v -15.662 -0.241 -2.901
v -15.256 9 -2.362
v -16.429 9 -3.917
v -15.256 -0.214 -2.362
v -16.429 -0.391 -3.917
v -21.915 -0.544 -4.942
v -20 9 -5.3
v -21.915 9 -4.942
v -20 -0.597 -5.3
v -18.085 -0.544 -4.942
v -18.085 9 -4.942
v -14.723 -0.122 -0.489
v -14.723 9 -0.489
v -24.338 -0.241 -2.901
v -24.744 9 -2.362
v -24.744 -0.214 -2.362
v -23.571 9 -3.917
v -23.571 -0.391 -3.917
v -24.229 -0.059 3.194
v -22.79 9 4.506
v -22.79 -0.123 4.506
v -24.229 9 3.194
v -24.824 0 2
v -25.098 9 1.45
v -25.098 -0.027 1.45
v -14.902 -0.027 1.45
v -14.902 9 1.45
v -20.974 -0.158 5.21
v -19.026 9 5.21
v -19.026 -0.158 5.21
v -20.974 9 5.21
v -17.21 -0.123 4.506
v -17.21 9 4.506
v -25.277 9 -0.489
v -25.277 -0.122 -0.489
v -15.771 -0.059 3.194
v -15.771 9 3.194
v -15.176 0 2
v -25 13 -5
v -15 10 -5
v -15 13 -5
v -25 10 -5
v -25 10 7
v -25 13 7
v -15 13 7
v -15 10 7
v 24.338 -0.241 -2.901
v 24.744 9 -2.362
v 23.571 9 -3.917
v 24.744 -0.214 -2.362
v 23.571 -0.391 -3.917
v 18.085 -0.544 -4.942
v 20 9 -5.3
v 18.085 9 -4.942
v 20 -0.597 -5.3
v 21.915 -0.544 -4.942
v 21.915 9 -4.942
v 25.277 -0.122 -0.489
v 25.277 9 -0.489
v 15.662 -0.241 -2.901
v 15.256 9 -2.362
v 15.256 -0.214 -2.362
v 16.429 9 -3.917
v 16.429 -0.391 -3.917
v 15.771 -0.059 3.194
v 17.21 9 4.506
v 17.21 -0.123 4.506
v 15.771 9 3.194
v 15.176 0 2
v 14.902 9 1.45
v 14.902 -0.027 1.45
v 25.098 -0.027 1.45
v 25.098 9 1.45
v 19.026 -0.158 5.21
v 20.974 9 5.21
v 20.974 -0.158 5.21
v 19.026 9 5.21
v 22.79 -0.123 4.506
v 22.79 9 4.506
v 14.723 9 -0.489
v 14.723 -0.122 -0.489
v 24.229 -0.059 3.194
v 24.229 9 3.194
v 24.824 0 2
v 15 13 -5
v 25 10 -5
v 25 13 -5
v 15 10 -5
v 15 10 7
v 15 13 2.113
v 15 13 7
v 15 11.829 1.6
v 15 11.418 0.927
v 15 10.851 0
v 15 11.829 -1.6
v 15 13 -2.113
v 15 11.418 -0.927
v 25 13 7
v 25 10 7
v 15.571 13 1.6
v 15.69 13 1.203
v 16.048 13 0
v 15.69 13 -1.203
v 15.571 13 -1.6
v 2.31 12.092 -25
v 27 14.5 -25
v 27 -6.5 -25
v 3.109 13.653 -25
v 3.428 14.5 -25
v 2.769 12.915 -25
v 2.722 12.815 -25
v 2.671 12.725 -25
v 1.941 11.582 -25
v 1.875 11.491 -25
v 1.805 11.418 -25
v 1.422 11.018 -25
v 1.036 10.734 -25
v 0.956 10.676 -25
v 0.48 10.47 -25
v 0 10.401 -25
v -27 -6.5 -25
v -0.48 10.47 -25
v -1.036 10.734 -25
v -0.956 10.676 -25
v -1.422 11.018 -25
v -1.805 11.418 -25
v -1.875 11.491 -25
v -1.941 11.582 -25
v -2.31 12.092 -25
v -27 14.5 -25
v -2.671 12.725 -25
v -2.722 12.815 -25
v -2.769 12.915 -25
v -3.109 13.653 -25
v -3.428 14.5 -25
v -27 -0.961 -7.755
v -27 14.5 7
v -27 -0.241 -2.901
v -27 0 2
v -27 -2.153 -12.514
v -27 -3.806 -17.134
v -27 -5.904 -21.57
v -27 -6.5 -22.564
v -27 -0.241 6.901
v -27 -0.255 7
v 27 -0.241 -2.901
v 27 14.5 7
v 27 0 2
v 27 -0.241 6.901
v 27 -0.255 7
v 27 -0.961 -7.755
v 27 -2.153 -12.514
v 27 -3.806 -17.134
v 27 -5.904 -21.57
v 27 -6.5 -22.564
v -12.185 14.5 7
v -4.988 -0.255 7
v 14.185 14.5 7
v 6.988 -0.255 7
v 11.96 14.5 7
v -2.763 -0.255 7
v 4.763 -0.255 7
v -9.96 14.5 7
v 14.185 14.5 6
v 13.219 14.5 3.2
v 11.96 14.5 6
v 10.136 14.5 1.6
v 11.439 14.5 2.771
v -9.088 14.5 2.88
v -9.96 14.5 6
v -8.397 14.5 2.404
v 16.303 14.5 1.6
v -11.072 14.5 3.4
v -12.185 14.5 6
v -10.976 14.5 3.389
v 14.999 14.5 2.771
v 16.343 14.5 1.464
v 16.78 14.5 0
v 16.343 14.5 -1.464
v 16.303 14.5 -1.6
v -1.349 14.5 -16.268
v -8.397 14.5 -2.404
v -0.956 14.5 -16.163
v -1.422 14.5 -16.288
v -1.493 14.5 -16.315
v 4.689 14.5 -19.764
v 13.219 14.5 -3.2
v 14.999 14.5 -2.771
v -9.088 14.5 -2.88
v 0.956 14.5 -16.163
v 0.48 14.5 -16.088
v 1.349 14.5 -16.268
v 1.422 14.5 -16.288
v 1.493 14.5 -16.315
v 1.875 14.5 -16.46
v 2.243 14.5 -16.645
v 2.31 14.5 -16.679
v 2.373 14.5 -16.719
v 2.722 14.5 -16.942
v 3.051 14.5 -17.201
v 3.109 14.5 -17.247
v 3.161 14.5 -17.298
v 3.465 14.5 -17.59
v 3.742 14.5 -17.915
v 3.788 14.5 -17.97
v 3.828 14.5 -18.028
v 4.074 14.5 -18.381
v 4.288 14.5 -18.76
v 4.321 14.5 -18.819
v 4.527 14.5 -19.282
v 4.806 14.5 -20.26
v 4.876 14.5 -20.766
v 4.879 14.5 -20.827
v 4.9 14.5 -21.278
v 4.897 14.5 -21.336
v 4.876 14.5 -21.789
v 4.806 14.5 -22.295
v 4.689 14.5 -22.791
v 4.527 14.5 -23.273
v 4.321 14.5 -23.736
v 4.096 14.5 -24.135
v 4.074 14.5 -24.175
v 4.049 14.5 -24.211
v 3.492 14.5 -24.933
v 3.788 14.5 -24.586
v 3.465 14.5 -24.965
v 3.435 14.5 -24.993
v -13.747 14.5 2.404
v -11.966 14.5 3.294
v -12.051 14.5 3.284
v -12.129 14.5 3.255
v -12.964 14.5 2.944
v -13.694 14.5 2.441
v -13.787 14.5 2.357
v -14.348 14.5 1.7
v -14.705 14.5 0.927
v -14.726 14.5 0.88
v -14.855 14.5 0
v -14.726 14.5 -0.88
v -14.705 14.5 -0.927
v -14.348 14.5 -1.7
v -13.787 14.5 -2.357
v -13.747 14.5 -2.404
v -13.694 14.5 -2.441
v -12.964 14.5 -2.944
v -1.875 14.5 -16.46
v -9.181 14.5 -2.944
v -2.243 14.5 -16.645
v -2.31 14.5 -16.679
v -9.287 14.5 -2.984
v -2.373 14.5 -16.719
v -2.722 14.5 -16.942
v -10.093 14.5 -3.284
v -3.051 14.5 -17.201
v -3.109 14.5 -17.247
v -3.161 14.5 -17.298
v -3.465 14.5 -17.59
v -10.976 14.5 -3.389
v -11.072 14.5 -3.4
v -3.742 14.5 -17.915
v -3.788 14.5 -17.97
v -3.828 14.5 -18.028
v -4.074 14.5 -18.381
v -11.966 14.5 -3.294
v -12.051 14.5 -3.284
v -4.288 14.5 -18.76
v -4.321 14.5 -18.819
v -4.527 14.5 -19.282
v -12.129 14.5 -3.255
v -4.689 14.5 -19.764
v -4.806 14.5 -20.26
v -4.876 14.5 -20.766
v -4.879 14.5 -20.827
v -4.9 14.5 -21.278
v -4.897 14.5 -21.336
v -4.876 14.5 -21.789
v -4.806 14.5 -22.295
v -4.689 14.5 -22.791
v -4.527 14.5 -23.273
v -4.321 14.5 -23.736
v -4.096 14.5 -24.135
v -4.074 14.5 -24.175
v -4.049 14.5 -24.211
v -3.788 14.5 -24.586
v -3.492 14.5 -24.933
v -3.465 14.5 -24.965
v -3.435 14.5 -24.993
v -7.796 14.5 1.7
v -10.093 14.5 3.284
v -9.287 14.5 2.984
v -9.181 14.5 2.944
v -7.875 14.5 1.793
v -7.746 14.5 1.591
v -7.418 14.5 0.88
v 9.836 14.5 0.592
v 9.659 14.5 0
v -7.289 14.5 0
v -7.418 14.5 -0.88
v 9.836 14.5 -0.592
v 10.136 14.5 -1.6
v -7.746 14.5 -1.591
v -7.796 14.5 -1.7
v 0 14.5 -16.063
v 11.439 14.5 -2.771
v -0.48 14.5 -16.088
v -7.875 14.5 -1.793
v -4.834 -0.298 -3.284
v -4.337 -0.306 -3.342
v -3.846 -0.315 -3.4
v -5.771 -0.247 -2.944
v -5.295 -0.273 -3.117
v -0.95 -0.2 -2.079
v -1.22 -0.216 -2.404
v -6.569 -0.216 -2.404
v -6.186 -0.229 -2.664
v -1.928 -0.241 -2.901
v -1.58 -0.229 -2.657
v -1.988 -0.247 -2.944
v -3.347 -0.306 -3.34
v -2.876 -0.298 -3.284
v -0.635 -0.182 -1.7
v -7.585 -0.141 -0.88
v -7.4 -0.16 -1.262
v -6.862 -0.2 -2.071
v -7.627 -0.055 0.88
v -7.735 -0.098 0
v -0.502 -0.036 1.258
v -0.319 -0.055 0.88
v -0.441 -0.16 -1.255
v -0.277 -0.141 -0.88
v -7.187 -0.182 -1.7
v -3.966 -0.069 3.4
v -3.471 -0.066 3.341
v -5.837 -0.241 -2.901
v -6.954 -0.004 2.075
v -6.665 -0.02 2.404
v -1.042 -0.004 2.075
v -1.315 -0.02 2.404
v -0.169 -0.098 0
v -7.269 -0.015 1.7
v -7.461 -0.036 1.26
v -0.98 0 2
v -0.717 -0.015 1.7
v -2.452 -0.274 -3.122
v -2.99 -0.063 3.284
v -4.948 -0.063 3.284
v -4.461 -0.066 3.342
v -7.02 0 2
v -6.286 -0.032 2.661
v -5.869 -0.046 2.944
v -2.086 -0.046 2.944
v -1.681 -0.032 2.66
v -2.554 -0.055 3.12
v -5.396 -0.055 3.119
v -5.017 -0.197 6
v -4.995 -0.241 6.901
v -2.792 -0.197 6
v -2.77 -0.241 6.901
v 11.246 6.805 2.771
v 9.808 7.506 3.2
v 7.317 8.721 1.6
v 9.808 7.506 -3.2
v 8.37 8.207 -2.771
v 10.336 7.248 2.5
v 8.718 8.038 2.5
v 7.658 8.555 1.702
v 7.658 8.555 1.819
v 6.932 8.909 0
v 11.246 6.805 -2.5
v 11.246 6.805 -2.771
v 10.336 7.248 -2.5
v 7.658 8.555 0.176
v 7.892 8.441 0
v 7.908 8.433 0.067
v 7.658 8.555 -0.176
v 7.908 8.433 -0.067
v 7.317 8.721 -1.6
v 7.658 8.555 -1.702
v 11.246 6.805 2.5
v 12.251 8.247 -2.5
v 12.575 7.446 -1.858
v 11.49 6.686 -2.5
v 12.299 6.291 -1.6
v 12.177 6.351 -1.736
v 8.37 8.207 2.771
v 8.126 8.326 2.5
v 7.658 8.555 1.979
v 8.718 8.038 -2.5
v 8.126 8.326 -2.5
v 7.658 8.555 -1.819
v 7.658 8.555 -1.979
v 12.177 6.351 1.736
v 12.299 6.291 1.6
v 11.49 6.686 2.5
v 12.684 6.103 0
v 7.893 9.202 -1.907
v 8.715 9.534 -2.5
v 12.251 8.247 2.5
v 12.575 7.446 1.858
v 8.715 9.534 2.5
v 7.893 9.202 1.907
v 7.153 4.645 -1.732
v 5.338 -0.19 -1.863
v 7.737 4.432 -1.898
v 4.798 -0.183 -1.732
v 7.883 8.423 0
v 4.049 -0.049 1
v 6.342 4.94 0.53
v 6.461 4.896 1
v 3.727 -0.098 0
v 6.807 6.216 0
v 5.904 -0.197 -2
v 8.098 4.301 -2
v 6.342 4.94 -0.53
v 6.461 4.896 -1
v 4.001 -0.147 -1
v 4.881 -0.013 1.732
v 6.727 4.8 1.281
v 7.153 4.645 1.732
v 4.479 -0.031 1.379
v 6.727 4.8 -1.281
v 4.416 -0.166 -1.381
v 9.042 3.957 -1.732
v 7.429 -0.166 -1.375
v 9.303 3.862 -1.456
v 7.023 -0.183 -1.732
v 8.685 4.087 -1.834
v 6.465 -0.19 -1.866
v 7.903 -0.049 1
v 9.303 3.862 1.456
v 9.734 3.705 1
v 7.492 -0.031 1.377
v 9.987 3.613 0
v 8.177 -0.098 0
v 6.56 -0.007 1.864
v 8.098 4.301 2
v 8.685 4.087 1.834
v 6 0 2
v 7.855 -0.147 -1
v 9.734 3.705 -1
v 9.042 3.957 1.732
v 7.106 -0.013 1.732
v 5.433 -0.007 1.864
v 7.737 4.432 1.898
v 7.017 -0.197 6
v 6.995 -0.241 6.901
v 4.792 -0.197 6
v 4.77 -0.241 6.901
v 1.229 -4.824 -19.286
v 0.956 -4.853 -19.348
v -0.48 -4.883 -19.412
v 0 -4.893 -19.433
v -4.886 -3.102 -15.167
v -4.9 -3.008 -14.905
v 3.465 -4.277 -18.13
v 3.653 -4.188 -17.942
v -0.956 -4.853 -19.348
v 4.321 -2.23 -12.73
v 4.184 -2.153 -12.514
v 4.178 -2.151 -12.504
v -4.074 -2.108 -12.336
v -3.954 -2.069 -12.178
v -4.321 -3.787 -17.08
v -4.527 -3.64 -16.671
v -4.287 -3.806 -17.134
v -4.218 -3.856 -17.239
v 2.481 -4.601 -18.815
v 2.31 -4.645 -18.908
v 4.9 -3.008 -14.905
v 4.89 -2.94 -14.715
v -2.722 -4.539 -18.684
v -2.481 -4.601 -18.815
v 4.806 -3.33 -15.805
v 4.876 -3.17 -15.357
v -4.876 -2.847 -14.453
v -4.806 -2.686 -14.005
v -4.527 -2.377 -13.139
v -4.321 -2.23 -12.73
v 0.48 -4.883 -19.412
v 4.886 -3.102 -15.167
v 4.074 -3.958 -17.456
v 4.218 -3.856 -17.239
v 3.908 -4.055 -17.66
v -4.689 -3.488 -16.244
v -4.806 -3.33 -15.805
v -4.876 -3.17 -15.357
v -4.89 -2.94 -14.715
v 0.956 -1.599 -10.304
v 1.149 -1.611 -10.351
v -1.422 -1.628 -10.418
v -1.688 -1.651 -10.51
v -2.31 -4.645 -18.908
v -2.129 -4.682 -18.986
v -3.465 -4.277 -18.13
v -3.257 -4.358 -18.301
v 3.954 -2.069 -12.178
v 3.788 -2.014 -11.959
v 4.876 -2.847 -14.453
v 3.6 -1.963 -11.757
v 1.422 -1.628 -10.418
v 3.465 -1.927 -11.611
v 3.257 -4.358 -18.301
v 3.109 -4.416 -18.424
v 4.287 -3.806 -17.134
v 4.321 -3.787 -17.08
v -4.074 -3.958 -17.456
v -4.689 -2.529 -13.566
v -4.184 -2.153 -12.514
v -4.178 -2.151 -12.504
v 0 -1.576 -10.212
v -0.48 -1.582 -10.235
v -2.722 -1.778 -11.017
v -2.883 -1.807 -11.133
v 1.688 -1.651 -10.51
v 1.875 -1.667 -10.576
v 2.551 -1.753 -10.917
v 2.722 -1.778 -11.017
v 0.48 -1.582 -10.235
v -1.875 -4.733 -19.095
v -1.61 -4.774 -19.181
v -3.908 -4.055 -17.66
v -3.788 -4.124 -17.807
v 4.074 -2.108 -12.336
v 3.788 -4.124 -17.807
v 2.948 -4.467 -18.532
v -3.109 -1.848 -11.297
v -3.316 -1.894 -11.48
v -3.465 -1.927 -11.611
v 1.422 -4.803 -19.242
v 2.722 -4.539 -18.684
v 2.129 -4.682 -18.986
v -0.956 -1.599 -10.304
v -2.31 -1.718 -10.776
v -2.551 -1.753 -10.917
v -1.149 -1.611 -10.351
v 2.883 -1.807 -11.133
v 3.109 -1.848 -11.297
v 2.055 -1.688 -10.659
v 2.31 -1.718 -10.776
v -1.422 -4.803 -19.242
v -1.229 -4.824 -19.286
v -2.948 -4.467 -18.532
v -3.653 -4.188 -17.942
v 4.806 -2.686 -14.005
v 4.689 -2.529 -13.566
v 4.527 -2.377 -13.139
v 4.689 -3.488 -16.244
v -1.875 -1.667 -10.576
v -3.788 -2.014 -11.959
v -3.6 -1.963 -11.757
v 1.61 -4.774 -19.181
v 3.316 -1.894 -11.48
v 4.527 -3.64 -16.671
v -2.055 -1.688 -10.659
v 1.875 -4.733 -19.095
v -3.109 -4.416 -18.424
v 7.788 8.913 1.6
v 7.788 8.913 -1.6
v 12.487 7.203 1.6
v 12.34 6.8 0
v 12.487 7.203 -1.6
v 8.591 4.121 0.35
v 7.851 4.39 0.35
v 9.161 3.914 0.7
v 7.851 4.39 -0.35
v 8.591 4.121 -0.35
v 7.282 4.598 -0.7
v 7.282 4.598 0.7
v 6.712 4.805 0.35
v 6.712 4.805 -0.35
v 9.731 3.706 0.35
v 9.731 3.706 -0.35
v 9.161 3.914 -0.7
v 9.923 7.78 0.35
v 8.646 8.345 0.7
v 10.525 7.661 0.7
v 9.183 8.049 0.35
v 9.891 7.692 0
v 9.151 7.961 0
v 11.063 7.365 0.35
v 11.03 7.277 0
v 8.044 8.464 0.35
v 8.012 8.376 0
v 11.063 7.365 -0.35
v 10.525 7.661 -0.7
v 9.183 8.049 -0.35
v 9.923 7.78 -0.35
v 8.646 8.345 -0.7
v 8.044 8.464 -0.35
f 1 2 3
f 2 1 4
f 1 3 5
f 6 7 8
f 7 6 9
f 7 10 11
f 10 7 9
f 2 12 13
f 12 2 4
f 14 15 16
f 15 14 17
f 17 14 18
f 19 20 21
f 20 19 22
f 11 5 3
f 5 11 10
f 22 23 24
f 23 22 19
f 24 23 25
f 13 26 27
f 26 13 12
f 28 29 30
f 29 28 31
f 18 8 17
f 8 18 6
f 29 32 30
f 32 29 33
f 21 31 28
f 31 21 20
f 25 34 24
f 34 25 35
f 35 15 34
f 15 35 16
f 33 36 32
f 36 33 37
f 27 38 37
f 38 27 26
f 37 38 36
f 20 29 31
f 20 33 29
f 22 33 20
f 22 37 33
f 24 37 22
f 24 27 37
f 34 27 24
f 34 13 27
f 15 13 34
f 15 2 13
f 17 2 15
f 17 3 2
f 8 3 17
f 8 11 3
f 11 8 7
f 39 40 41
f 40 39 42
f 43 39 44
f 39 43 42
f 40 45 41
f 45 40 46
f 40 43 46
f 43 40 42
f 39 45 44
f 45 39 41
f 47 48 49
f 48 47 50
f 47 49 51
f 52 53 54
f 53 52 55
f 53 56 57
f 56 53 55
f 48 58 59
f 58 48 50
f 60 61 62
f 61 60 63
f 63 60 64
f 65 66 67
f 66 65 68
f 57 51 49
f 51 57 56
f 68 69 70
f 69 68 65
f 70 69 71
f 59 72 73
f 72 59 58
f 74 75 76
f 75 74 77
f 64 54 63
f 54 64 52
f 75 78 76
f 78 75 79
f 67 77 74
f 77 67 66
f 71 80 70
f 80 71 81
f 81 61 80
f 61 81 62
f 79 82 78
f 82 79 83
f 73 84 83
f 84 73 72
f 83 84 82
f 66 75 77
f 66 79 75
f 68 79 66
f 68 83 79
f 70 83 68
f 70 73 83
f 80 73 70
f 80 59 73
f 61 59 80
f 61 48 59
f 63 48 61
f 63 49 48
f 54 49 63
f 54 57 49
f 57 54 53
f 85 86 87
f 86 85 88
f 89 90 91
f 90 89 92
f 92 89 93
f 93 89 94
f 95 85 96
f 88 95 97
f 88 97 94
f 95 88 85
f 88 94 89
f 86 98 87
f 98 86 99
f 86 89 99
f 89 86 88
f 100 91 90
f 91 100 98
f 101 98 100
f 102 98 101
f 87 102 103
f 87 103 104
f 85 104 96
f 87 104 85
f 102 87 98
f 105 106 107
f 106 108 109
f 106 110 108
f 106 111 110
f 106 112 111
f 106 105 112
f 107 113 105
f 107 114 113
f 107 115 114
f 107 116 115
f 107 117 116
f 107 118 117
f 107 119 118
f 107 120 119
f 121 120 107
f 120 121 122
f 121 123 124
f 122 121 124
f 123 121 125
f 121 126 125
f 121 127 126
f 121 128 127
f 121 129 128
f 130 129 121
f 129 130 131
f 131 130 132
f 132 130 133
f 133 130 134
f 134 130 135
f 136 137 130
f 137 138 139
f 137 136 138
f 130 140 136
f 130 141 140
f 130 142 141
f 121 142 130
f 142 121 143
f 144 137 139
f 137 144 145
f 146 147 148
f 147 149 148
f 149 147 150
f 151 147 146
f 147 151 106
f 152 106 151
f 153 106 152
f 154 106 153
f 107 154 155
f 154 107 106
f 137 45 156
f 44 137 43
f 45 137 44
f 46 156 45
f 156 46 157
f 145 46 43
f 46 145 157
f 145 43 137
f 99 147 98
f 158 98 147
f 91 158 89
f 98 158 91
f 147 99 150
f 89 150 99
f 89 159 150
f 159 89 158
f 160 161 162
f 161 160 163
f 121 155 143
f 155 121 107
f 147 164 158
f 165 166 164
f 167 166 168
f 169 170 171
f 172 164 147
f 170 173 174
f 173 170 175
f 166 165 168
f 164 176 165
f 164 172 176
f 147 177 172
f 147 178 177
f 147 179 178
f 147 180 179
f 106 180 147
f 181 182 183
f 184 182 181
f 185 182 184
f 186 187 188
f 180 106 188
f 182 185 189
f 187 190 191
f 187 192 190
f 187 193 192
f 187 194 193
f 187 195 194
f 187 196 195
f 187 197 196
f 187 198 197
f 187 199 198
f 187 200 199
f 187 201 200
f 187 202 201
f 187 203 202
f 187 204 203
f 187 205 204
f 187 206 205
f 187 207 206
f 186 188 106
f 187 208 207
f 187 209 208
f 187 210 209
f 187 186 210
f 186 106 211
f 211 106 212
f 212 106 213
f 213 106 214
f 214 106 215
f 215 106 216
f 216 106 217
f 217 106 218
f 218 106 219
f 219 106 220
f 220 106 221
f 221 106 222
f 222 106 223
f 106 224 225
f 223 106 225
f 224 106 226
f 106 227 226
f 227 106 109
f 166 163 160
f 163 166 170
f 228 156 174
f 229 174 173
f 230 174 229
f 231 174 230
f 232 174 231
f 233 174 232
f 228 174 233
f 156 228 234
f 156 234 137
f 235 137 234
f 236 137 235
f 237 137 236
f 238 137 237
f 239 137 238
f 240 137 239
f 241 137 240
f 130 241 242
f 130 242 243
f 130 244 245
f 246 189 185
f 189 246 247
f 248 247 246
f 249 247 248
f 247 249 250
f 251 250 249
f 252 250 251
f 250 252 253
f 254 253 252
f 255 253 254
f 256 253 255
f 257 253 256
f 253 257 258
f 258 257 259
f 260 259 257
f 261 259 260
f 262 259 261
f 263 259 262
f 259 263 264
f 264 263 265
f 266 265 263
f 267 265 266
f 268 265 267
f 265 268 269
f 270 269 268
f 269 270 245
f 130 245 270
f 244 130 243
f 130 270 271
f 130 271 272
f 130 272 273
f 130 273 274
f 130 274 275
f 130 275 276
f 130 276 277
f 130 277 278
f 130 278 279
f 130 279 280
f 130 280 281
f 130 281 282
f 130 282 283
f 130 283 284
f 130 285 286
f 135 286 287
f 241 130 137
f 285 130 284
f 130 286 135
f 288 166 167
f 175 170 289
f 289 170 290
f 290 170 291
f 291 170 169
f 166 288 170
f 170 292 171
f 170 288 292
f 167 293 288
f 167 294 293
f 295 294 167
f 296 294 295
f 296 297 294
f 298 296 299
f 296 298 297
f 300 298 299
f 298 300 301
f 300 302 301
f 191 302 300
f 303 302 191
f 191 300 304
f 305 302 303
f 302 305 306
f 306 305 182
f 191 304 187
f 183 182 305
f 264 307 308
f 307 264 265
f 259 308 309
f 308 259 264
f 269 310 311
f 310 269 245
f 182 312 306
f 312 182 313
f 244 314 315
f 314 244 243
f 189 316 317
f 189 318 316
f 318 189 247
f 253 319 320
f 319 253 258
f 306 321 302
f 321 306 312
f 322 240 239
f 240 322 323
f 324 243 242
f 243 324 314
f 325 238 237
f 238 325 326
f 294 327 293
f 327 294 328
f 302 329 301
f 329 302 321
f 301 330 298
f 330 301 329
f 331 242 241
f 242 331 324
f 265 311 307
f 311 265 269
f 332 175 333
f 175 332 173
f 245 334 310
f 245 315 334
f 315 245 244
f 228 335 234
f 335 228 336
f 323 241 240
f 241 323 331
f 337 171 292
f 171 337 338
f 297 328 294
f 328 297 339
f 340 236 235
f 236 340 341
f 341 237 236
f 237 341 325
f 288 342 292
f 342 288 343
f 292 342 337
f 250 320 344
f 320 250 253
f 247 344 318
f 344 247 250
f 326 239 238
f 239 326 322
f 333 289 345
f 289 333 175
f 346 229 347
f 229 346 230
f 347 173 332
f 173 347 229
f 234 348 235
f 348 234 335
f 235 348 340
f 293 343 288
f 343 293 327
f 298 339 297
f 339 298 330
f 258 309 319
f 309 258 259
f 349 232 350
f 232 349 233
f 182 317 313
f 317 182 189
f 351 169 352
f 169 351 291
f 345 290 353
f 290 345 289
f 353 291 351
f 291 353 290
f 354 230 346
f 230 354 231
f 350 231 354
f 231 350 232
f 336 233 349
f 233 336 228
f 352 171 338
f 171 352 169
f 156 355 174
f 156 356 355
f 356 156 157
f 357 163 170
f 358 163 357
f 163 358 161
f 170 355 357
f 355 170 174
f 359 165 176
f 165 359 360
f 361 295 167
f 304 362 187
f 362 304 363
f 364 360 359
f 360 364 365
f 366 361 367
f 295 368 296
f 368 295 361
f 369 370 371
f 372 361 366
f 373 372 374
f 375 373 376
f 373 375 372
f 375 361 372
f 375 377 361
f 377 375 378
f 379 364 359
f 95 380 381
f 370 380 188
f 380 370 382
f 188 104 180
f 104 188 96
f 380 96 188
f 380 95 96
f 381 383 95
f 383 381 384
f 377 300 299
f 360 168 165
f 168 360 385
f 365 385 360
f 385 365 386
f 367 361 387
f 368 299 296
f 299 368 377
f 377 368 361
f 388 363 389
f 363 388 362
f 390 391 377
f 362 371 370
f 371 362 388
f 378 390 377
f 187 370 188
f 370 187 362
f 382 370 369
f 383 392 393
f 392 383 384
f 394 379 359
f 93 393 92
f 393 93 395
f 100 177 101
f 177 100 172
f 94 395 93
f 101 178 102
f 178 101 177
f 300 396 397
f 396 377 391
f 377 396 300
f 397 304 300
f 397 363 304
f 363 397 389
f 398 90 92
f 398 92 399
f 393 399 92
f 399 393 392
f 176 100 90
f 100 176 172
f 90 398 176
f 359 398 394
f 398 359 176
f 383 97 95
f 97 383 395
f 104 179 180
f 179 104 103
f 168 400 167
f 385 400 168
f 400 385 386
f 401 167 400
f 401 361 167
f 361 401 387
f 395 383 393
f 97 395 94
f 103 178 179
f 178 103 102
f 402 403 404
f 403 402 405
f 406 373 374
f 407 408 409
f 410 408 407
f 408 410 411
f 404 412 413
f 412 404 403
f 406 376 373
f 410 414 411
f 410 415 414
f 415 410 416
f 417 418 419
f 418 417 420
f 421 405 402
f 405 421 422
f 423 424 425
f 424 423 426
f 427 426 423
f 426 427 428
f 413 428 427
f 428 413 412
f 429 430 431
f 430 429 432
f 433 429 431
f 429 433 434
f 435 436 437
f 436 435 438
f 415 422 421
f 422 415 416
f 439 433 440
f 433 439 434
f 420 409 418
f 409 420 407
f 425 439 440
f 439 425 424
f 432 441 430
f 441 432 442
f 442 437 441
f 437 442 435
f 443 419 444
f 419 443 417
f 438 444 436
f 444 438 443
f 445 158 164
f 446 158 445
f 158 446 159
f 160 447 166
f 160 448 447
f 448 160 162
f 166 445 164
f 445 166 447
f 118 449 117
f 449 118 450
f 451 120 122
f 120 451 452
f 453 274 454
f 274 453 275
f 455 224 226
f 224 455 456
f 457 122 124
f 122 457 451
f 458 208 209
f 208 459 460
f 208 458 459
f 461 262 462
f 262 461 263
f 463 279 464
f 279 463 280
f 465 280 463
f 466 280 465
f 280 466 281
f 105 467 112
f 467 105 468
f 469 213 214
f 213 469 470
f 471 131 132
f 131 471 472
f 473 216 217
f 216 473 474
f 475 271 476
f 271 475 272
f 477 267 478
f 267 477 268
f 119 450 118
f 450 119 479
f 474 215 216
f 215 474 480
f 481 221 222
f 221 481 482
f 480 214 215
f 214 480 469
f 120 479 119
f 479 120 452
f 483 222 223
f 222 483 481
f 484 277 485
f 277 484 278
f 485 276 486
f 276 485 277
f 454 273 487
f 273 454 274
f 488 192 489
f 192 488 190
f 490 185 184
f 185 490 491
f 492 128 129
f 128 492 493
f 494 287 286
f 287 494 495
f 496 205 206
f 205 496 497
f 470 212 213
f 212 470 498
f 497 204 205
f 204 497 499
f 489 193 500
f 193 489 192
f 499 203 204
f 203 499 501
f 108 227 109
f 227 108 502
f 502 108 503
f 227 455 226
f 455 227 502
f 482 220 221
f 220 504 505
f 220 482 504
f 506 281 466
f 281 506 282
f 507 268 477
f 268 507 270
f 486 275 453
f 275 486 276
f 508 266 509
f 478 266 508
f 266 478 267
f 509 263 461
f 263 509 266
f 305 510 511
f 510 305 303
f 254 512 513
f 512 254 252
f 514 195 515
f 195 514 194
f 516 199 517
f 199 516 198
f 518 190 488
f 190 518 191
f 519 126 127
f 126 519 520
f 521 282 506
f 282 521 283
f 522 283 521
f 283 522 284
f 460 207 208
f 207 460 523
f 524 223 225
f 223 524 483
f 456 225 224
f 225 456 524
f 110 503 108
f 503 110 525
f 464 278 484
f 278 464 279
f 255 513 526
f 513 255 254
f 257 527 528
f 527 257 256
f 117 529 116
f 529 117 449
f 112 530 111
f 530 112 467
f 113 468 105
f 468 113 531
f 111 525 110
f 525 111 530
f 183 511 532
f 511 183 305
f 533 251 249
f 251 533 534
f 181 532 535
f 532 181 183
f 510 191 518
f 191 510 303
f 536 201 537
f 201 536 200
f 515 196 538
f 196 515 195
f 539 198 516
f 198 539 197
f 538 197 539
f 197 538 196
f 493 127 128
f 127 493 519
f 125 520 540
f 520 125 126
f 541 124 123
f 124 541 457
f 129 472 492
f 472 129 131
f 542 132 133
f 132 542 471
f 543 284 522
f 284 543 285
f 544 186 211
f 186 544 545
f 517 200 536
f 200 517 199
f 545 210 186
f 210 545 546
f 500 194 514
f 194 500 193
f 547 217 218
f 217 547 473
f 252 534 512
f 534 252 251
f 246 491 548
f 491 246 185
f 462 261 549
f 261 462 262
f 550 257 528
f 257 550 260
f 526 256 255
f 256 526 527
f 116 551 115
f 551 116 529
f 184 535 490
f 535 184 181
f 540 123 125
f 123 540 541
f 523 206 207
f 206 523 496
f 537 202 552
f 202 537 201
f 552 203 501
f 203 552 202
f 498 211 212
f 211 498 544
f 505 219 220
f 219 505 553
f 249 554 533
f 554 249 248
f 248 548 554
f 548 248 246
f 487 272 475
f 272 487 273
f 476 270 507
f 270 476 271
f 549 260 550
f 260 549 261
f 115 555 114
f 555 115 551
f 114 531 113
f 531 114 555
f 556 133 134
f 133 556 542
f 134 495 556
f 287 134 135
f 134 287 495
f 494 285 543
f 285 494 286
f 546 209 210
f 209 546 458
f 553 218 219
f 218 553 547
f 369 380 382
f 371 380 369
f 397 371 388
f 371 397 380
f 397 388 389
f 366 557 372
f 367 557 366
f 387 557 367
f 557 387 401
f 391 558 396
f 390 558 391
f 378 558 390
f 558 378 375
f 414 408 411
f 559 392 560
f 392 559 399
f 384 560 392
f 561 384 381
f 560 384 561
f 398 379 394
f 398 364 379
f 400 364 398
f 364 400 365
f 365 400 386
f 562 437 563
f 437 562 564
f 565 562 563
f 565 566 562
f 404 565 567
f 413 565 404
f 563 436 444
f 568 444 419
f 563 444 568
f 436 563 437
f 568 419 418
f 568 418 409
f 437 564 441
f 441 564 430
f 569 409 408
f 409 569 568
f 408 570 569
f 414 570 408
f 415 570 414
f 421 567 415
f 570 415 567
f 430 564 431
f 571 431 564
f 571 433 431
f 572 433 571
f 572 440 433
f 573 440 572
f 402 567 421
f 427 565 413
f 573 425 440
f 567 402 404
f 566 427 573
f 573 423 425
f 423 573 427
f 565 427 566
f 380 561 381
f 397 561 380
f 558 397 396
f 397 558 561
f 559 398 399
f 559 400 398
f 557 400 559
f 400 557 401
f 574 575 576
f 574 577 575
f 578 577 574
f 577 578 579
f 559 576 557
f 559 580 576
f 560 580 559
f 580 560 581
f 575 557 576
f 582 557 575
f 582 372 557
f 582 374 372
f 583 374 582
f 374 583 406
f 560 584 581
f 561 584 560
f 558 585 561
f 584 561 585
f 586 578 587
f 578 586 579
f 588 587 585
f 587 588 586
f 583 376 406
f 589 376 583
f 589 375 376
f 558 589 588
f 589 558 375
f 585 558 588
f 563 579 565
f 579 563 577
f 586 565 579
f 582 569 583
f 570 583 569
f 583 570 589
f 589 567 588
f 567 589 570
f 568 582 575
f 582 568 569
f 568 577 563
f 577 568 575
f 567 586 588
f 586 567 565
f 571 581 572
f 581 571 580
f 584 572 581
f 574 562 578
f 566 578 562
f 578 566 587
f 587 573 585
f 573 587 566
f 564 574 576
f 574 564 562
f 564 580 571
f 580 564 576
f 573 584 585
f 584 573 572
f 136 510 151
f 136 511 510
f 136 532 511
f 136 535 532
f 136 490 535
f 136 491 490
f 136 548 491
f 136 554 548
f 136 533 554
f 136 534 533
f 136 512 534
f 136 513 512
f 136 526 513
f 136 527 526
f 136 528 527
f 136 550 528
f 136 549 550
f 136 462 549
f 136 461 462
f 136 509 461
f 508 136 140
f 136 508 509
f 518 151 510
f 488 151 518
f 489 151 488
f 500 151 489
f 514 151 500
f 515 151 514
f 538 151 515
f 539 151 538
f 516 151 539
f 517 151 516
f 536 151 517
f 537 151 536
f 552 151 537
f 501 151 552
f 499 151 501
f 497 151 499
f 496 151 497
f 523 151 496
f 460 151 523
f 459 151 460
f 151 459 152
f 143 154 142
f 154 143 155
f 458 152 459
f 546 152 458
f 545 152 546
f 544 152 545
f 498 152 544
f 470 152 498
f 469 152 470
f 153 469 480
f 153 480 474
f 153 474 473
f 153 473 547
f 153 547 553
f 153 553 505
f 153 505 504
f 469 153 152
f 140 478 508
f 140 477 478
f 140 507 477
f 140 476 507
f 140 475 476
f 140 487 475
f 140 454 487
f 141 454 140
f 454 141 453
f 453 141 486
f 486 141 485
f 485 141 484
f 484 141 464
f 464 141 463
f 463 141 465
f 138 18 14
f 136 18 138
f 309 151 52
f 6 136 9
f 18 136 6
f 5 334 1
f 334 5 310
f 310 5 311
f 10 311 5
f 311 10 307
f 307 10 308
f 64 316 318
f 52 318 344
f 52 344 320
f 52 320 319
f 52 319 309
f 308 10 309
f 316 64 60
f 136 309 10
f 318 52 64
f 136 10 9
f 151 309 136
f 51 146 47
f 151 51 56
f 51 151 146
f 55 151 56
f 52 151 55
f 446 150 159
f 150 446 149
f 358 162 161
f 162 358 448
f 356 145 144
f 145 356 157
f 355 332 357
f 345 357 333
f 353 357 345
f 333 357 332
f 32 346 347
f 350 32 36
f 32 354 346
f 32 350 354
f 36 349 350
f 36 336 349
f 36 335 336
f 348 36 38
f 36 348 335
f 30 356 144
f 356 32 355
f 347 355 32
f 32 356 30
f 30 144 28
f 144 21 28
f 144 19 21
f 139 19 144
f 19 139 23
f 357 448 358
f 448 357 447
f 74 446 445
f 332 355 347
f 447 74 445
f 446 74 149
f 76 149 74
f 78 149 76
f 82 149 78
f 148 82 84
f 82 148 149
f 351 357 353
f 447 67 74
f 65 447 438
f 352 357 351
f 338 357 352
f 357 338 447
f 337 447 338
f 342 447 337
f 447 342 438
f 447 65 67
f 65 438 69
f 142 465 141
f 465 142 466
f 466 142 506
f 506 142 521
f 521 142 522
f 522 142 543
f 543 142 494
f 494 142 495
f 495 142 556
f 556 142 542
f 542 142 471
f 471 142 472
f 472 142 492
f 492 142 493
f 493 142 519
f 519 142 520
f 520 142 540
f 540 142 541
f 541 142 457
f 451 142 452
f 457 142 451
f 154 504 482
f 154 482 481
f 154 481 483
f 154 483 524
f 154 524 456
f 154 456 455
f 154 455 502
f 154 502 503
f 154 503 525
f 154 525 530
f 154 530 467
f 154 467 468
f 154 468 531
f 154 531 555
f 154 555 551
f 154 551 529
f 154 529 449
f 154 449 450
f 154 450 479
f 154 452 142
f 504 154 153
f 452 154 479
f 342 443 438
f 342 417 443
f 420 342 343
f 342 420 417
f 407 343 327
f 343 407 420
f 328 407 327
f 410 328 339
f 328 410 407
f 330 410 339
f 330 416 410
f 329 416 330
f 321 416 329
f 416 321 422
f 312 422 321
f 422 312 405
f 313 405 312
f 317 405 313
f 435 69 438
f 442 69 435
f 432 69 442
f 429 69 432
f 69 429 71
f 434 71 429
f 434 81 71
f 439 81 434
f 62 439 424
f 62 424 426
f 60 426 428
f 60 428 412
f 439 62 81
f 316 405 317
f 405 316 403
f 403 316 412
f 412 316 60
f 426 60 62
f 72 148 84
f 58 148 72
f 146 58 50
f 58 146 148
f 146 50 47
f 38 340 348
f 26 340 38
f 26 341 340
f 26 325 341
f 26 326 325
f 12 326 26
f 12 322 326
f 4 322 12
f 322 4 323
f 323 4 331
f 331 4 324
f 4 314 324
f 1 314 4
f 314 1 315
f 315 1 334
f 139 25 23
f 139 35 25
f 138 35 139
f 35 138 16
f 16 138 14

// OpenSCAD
diameter=10;
height=4;
number=3;
distance=5;
baseline=36; 


module maghole(diameter,height,number,back) {
		translate([0,height*(number-2)/2,0])
        rotate([90,0,0])
         cylinder(r=diameter/2,h=height*(2*number-1),center=true);
    if(back == 1) {
		translate([0,-height*2*(number+1)/2,0])
        rotate([90,0,0])
         cylinder(r=diameter/6,h=height*number,center=true);
    }
}

module smaghole(diameter,height,number,back) {
		translate([0,.15+height*(number-2)/2,0])
        rotate([90,0,0])
         cylinder(r=0.3+diameter/2,h=height*(2*number-1),center=true);
    if(back == 1) {
		translate([0,-7,0])
        rotate([90,0,0])
         cylinder(r=0.3+diameter/2,h=height,center=true);
    }
    translate([-9,-13,-5]) cube([4+diameter,3,diameter]);    
   // translate([-1,-15,0]) cube([3,3,10]);
}
module mirror(diameter,height,number,distance,baseline) {
width=diameter+4;
depth=distance+height*number+4;
length=baseline+diameter+8;
mirrorthick = 2.7;
   difference() {
     translate([0,-height,0])
	   cube([width,  // Small dimension
            depth, // Optical path dim
		      length],center=true);
      translate([0,0,2+baseline/2])
             maghole(diameter,height,number,0);
     translate([0,0,-(2+baseline/2)])
             maghole(diameter,height,number,0);
     translate([0,depth/4,0])
          cube([width+2,depth+2,length-2*width],center=true);
    rotate([7,0,0])
     translate([0,0.6-depth/3,0.75])
          cube([width+2,mirrorthick+0.6,length-(2*diameter+4)],center=true);
     }
}

module sensor(diameter,height,number,distance,baseline) {
width=diameter+4;
depth=distance+height*number+4;
length=baseline+diameter+8;
mirrorthick = 2.6;
extra=2*width+4;

   difference() {
     translate([2+width/2,-height,0])
	   cube([extra,  // Small dimension
            depth, // Optical path dim
		      length],center=true);
      translate([0,0,2+baseline/2])
             smaghole(diameter,height,number,1);
     translate([0,0,-(2+baseline/2)])
             smaghole(diameter,height,number,1);
//LASER
     translate([0,0,4])
        rotate([64,0,0])
             cylinder(r=3.4,h=40,center=true,$fn=24);
     translate([-11,0,4])
        rotate([64,0,0]) cube([10,2,40],center=true);
//PhotoTransistor
     translate([0,-12,-12])
        rotate([116,0,0])
             cylinder(r=3.2,h=10,center=true,$fn=12);
     translate([0,0,-6])
        rotate([116,0,0])
             cylinder(r=2,h=40,center=true,$fn=12);
     translate([-11,0,-6])
        rotate([116,0,0]) cube([10,2,40],center=true);
//TEMP SENSOR
     translate([2+width,0,0])
        rotate([90,0,20])
             cylinder(r=4.9,h=40,center=true,$fn=64);

     }
translate([0,-4,-6])
rotate([20,0,0])
     difference() {
     translate([0,-4,-2.5])cube([5,6,5],center=true);
     translate([0,-8,0])
        cylinder(r=3.2,h=10,center=true,$fn=12);
     translate([0,0,-1.0])
        rotate([90,0,0])
             cylinder(r=0.7,h=40,center=true,$fn=6);
     translate([0,0,-3])
        rotate([90,0,0])
             cylinder(r=0.7,h=40,center=true,$fn=6);
     }
}

module jarwall() {
  difference() {
     cube([40,40,120],center=true);
	  translate([40,0,0])
	     cylinder(r=50,h=120,center=true,$fn=64);
	   }
}

module jar() {
	  translate([-8,110,-10])
	          cylinder(r=50,h=120,center=true,$fn=64);
}

module powerhole(dim) {
offset = dim+2;
  //  cylinder(r=dim,h=2*dim,center=true,$fn=10);
  //  translate([dim-1.6,0,0])
   //   cylinder(r=dim,h=dim,center=true,$fn=10);
    translate([dim-3,0,0]) cube([2*dim+2,2*dim-1,2*dim-1],center=true);
    translate([-offset,0,0])
      cylinder(r=1.1,h=2*dim,center=true,$fn=10);
    translate([offset+2,0,0])
      cylinder(r=1.1,h=2*dim,center=true,$fn=10);
}

module sensordevice() {
  wall = 32;
  side = 44;
  deep = 50;
  difference() { 
   sensor(diameter,height,number,distance,baseline);
   translate([6,-60,3]) jar();
  }
//  translate([-7,-(wall+30),21]) cube([wall,side+12,3]);

//     translate([-7,-(wall+30),-24])
//         cube([wall,side+12,3]);

//  difference() {
//  translate([23.5,-(wall+7),0])
//    rotate([0,90,0])
//    cube([side,deep,3],center=true);
//     translate([24,-54,12])
//			rotate([0,90,0]) 
//           powerhole(4.5);
//  }
}
module mirrordevice() {
  difference() { 
   mirror(diameter,height,number,distance,baseline);
   translate([0,-3.3,0]) rotate([0,0,-90]) jarwall();
  }
}

rotate([0,90,180]) 
   sensordevice();
  // mirrordevice();



     
